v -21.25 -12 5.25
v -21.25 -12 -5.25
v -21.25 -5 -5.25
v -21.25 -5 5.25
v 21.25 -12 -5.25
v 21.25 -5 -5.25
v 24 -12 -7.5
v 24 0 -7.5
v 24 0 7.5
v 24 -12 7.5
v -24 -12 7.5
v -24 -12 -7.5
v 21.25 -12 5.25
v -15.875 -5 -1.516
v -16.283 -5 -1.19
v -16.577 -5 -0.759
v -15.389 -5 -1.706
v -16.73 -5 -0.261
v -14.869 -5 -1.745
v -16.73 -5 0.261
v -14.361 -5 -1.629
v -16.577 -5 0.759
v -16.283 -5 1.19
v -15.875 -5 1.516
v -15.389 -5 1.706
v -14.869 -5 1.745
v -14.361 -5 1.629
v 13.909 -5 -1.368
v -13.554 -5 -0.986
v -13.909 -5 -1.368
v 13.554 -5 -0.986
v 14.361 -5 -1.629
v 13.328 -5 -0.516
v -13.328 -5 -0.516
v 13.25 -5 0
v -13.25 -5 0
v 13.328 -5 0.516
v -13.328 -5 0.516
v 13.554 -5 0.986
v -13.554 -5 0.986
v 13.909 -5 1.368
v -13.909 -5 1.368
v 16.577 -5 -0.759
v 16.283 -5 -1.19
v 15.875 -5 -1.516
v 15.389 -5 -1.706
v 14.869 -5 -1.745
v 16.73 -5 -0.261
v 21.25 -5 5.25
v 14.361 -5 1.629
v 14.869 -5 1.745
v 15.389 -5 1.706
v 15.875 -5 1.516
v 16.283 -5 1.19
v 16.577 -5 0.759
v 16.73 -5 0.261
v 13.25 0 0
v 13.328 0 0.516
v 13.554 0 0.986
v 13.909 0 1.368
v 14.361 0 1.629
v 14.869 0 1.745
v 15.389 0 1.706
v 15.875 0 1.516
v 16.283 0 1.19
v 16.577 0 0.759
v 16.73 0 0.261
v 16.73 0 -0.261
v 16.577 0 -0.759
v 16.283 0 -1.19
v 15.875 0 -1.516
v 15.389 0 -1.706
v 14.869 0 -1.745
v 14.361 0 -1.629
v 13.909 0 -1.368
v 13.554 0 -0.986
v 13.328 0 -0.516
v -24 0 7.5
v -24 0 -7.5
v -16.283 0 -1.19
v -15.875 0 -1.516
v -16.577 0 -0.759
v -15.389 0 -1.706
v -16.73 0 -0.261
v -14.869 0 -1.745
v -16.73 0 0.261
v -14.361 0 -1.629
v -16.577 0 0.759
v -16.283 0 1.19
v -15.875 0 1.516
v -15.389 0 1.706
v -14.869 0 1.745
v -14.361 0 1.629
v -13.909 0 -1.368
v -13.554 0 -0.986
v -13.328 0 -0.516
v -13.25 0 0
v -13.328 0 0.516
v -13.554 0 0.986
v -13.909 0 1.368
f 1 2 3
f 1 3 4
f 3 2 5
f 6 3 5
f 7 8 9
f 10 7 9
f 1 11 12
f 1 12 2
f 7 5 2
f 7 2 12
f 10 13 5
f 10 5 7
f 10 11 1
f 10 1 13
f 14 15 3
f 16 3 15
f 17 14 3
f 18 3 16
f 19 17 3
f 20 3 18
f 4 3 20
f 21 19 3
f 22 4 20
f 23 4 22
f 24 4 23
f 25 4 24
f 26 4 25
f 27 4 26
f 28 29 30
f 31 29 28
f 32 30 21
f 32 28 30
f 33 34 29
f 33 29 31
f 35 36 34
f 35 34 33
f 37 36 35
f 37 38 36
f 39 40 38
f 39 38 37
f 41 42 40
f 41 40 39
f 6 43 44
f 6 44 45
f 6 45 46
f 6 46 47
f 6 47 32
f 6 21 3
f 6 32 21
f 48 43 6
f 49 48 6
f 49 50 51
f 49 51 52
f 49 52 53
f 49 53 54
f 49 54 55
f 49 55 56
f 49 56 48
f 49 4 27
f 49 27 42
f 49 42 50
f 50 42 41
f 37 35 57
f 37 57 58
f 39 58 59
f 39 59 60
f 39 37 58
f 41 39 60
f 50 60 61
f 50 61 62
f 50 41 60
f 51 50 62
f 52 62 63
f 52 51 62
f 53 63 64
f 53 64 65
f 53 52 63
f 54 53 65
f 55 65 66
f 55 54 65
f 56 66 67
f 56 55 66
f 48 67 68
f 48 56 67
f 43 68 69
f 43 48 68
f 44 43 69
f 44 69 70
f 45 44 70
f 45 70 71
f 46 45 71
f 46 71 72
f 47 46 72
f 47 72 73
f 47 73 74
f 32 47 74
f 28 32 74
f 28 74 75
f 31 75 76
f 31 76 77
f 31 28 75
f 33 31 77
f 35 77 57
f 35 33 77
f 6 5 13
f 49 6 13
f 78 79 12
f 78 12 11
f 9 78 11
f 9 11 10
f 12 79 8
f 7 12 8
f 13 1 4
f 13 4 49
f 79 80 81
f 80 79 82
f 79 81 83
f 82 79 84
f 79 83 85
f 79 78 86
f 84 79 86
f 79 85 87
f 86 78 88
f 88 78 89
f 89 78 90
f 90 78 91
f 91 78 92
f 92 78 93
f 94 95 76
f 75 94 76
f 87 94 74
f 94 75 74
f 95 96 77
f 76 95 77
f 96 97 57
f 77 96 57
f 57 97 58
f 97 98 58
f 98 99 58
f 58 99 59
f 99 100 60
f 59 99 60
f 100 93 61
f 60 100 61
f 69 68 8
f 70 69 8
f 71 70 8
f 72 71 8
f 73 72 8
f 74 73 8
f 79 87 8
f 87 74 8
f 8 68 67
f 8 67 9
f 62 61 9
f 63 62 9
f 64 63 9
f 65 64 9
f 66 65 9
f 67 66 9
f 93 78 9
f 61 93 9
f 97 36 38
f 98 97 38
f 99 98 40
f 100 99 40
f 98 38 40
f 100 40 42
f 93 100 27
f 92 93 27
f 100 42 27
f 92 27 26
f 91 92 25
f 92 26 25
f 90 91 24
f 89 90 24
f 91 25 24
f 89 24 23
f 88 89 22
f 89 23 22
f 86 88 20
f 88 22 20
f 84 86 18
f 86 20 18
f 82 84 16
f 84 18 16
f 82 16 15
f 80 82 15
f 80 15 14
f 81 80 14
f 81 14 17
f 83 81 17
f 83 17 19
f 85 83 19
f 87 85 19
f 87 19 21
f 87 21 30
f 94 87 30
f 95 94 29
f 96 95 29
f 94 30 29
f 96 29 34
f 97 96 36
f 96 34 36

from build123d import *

# Parameters (mm, degrees)
F0_W     = 48
F0_H     = 15
F1_DEPTH = 12
F2_W     = 42.5
F2_H     = 10.5
F3_DEPTH = 7
F4_R     = 1.75
F5_DEPTH = 5


# Not quite as in the source:
# - a pattern or mirror of a feature is missing from the dataset's text; its kind, count and spacing are read off the source's solid


with BuildPart() as f1:
    # F0 (on Front) → F1 (new body)
    with BuildSketch(Plane.XZ):
        Rectangle(F0_W, F0_H)
    extrude(amount=F1_DEPTH)

    # F2 (on face) → F3 (cut)
    with BuildSketch(Plane.XZ.offset(12)):
        Rectangle(F2_W, F2_H)
    extrude(amount=-F3_DEPTH, mode=Mode.SUBTRACT)

    # F4 (on face) → F5 (cut, through all)
    with BuildSketch(Plane.XZ.offset(5)):
        with Locations((-15, 0)):
            Circle(F4_R)
    f5 = extrude(amount=-F5_DEPTH, mode=Mode.SUBTRACT)

    # F5_copies: F5 across plane
    add(f5.mirror(Plane(origin=(0, 0, 0), x_dir=(0, 0, 1), z_dir=(1, 0, 0))), mode=Mode.SUBTRACT)


solid = f1.part
